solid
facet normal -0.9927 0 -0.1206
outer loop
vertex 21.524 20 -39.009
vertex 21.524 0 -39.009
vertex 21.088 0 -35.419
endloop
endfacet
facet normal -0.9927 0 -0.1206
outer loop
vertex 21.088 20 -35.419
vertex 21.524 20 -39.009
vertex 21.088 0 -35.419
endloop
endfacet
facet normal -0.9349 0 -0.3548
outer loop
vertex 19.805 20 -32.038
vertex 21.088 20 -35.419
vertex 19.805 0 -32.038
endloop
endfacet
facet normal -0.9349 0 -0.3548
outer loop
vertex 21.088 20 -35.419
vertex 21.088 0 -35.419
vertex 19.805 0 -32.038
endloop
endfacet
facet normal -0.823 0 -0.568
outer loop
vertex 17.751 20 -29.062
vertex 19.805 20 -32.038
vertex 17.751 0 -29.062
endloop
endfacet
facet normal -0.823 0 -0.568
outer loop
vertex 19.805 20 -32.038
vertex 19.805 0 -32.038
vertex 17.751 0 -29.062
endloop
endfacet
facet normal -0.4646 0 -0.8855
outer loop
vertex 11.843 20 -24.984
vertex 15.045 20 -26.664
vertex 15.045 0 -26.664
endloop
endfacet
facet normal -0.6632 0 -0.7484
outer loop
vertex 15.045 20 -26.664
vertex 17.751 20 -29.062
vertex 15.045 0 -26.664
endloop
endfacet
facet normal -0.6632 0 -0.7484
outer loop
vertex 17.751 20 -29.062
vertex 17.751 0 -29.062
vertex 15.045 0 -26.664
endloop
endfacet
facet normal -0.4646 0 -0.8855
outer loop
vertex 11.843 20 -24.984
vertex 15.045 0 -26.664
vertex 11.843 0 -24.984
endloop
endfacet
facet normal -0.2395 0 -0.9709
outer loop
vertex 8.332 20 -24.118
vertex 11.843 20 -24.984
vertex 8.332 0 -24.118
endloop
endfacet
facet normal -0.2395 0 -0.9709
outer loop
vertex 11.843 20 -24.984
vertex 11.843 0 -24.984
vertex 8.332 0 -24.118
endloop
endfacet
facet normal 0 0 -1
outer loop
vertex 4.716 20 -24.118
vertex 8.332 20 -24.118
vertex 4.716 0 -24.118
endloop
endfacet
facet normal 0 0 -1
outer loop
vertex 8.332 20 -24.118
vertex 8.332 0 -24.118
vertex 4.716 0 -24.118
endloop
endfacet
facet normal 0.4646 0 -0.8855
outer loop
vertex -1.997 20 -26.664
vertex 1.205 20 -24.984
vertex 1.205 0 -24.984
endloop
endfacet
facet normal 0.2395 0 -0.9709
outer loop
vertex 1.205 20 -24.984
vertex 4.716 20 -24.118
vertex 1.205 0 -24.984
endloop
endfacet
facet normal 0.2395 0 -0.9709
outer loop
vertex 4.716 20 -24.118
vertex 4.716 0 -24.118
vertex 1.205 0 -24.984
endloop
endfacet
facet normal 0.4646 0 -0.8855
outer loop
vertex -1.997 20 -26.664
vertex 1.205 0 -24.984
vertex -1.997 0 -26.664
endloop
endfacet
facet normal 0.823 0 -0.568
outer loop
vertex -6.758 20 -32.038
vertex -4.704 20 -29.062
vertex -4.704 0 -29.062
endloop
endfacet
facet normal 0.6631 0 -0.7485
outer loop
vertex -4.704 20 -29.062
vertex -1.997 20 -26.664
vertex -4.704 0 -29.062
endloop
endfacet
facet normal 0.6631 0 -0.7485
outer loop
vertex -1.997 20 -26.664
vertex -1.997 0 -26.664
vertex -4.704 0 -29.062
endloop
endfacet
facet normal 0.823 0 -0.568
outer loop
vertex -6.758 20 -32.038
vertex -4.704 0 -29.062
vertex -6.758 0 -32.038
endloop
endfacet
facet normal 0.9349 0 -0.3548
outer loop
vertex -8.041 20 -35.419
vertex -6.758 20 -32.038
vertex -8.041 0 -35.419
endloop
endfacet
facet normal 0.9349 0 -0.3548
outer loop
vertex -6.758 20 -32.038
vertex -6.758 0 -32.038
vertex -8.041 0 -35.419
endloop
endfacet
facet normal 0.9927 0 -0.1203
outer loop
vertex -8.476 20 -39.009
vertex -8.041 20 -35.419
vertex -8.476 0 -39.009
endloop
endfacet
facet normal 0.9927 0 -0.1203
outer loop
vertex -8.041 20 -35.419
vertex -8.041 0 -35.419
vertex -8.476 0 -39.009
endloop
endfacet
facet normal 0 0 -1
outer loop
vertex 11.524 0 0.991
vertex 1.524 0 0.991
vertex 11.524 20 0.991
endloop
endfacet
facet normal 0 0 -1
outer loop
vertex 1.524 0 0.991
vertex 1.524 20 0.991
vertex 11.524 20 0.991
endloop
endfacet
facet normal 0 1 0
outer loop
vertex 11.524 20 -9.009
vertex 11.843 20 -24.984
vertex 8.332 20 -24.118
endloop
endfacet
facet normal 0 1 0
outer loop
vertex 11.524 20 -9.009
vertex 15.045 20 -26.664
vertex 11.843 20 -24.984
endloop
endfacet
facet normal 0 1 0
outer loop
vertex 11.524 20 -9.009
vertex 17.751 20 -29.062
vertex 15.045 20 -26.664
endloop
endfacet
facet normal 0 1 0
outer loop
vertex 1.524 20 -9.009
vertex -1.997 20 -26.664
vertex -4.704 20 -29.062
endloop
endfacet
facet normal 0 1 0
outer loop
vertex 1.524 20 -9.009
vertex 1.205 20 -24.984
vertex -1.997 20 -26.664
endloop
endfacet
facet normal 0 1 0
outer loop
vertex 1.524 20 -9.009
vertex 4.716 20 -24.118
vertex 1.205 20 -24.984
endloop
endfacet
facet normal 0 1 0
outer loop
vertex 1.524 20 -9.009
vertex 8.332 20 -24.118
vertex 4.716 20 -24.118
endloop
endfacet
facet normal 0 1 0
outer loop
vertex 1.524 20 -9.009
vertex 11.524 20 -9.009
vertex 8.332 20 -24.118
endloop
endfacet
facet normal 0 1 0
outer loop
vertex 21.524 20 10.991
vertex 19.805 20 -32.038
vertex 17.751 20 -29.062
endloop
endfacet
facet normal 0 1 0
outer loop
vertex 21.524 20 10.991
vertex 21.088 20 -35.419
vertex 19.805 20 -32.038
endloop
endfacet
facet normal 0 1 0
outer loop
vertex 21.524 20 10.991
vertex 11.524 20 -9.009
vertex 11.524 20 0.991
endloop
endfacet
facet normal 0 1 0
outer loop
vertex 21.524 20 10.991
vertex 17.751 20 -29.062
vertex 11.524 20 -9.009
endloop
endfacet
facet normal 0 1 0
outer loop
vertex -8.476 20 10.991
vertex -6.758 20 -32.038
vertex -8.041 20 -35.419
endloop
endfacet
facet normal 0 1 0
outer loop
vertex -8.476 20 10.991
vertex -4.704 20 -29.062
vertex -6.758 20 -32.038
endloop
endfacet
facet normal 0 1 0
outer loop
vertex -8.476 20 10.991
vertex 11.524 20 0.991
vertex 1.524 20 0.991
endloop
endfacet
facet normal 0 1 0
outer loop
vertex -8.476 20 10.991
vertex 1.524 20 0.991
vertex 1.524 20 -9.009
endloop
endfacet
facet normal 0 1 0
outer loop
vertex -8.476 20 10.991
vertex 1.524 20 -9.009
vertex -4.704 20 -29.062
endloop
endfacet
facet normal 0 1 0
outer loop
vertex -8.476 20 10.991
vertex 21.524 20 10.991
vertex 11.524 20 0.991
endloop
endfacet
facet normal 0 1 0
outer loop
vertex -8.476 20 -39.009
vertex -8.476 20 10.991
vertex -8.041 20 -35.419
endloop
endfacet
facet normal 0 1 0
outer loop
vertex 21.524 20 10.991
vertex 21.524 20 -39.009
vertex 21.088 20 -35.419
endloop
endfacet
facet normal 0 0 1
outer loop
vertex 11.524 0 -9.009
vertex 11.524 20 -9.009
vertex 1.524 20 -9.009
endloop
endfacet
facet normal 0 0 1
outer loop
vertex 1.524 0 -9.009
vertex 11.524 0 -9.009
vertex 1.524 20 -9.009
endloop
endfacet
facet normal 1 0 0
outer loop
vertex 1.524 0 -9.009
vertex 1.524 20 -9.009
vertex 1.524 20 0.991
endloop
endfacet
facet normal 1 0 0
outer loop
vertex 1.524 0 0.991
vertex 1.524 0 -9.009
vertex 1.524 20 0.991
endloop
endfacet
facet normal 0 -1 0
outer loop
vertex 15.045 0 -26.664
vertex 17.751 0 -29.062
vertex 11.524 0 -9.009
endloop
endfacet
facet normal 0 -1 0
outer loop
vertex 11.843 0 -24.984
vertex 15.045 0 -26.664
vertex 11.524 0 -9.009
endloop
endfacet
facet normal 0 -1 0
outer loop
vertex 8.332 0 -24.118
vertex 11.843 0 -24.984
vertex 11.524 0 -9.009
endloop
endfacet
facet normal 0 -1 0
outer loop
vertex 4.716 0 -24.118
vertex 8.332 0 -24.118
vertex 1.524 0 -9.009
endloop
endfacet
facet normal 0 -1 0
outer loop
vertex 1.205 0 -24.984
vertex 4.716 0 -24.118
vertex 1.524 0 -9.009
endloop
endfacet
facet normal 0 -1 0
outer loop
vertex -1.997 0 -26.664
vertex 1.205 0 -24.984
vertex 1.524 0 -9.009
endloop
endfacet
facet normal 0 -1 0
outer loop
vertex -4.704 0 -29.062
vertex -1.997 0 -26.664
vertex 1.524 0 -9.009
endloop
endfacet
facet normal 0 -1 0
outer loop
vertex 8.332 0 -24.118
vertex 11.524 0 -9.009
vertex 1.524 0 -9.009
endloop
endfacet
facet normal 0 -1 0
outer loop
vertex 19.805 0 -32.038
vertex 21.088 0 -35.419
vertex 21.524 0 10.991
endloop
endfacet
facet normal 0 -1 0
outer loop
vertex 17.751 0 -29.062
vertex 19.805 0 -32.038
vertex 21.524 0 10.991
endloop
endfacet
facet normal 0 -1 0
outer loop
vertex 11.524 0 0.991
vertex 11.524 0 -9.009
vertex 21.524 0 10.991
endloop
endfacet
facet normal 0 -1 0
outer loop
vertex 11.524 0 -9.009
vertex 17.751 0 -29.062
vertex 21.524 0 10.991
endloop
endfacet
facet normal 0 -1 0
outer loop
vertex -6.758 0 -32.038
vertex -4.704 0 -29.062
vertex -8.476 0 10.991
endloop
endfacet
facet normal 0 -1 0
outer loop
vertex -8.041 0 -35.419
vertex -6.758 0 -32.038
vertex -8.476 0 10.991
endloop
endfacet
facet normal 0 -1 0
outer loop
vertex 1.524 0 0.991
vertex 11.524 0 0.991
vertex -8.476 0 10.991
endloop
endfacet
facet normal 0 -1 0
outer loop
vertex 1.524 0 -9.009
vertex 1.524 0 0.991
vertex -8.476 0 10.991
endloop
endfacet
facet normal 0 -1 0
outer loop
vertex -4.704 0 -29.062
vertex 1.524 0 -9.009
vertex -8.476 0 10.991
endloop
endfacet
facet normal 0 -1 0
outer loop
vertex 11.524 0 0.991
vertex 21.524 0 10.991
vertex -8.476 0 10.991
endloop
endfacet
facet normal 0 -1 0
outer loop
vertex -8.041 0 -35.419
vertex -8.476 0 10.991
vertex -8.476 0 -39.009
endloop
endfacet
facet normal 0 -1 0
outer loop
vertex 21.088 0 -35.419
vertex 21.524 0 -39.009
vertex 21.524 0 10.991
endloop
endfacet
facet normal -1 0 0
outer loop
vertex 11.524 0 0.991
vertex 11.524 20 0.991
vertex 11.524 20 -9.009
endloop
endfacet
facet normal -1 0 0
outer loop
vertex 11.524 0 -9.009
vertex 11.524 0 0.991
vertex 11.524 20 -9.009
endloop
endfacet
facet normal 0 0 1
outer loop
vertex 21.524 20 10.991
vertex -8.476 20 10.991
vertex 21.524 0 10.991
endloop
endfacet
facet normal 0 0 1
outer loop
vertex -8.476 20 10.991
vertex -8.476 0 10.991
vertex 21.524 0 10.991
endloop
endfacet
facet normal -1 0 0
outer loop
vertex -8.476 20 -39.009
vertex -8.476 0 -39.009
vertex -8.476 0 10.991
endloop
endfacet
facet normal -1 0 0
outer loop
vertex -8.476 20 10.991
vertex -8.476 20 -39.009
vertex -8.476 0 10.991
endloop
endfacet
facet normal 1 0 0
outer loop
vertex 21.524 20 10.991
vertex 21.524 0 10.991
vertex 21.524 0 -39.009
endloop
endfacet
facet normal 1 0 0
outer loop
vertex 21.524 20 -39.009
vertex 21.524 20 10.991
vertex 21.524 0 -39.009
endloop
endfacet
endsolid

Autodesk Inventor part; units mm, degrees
ref_plane "YZ Plane" through (0, 0, 0) normal (1, 0, 0) x (0, 1, 0)
ref_plane "XZ Plane" through (0, 0, 0) normal (0, 1, 0) x (-1, 0, 0)
ref_plane "XY Plane" through (0, 0, 0) normal (0, 0, 1) x (1, 0, 0)
sketch "スケッチ1" plane through (0, 0, 0) normal (0, 1, 0) x (-1, 0, 0)
  line L0 (8.4764, 10.991) -> (-21.5236, 10.991)
  line L1 (-21.5236, 10.991) -> (-21.5236, -39.009)
  line L2 (-21.5236, -39.009) -> (8.4764, -39.009)
  line L3 (8.4764, -39.009) -> (8.4764, 10.991)
  point P0 (0, 0)
  dimension "d0" = 30
  dimension "d1" = 50
extrude "押し出し1" add sketch "スケッチ1" along normal blind 20
sketch "スケッチ2" plane through (0, 20, 0) normal (0, 1, 0) x (1, 0, 0)
  line L0 (21.5236, 39.009) -> (-8.4764, 39.009) projected
  circle A0 centre (6.5236, 39.009) radius 15
  point P0 (0, 0)
  dimension "d4" = 30
hole "穴1" at (6.5236, 20, -39.009) direction (0, -1, 0) diameter 30 depth 20
sketch "スケッチ3" plane through (0, 20, 0) normal (0, 1, 0) x (1, 0, 0)
  line L0 (1.5236, -0.991) -> (11.5236, -0.991)
  line L1 (11.5236, -0.991) -> (11.5236, 9.009)
  line L2 (11.5236, 9.009) -> (1.5236, 9.009)
  line L3 (1.5236, 9.009) -> (1.5236, -0.991)
  line L4 (-8.4764, 39.009) -> (-8.4764, -10.991) projected
  line L5 (-8.4764, -10.991) -> (21.5236, -10.991) projected
  point P0 (0, 0)
  dimension "d12" = 10
  dimension "d13" = 10
  dimension "d14" = 10
  dimension "d15" = 10
extrude "押し出し2" cut sketch "スケッチ3" against normal blind 20
equation "\"BendRadius\" = Thickness"
equation "\"BendReliefWidth\" = Thickness"
equation "\"BendReliefDepth\" = 0.5 * Thickness"
equation "\"CornerReliefSize\" = 4 * Thickness"
equation "\"MinimumRemnant\" = 2 * Thickness"
equation "\"TransitionRadius\" = BendRadius"
equation "\"JacobiRadiusSize\" = BendRadius"
equation "\"GapSize\" = Thickness"
equation "\"Thickness\" = 0.5"
